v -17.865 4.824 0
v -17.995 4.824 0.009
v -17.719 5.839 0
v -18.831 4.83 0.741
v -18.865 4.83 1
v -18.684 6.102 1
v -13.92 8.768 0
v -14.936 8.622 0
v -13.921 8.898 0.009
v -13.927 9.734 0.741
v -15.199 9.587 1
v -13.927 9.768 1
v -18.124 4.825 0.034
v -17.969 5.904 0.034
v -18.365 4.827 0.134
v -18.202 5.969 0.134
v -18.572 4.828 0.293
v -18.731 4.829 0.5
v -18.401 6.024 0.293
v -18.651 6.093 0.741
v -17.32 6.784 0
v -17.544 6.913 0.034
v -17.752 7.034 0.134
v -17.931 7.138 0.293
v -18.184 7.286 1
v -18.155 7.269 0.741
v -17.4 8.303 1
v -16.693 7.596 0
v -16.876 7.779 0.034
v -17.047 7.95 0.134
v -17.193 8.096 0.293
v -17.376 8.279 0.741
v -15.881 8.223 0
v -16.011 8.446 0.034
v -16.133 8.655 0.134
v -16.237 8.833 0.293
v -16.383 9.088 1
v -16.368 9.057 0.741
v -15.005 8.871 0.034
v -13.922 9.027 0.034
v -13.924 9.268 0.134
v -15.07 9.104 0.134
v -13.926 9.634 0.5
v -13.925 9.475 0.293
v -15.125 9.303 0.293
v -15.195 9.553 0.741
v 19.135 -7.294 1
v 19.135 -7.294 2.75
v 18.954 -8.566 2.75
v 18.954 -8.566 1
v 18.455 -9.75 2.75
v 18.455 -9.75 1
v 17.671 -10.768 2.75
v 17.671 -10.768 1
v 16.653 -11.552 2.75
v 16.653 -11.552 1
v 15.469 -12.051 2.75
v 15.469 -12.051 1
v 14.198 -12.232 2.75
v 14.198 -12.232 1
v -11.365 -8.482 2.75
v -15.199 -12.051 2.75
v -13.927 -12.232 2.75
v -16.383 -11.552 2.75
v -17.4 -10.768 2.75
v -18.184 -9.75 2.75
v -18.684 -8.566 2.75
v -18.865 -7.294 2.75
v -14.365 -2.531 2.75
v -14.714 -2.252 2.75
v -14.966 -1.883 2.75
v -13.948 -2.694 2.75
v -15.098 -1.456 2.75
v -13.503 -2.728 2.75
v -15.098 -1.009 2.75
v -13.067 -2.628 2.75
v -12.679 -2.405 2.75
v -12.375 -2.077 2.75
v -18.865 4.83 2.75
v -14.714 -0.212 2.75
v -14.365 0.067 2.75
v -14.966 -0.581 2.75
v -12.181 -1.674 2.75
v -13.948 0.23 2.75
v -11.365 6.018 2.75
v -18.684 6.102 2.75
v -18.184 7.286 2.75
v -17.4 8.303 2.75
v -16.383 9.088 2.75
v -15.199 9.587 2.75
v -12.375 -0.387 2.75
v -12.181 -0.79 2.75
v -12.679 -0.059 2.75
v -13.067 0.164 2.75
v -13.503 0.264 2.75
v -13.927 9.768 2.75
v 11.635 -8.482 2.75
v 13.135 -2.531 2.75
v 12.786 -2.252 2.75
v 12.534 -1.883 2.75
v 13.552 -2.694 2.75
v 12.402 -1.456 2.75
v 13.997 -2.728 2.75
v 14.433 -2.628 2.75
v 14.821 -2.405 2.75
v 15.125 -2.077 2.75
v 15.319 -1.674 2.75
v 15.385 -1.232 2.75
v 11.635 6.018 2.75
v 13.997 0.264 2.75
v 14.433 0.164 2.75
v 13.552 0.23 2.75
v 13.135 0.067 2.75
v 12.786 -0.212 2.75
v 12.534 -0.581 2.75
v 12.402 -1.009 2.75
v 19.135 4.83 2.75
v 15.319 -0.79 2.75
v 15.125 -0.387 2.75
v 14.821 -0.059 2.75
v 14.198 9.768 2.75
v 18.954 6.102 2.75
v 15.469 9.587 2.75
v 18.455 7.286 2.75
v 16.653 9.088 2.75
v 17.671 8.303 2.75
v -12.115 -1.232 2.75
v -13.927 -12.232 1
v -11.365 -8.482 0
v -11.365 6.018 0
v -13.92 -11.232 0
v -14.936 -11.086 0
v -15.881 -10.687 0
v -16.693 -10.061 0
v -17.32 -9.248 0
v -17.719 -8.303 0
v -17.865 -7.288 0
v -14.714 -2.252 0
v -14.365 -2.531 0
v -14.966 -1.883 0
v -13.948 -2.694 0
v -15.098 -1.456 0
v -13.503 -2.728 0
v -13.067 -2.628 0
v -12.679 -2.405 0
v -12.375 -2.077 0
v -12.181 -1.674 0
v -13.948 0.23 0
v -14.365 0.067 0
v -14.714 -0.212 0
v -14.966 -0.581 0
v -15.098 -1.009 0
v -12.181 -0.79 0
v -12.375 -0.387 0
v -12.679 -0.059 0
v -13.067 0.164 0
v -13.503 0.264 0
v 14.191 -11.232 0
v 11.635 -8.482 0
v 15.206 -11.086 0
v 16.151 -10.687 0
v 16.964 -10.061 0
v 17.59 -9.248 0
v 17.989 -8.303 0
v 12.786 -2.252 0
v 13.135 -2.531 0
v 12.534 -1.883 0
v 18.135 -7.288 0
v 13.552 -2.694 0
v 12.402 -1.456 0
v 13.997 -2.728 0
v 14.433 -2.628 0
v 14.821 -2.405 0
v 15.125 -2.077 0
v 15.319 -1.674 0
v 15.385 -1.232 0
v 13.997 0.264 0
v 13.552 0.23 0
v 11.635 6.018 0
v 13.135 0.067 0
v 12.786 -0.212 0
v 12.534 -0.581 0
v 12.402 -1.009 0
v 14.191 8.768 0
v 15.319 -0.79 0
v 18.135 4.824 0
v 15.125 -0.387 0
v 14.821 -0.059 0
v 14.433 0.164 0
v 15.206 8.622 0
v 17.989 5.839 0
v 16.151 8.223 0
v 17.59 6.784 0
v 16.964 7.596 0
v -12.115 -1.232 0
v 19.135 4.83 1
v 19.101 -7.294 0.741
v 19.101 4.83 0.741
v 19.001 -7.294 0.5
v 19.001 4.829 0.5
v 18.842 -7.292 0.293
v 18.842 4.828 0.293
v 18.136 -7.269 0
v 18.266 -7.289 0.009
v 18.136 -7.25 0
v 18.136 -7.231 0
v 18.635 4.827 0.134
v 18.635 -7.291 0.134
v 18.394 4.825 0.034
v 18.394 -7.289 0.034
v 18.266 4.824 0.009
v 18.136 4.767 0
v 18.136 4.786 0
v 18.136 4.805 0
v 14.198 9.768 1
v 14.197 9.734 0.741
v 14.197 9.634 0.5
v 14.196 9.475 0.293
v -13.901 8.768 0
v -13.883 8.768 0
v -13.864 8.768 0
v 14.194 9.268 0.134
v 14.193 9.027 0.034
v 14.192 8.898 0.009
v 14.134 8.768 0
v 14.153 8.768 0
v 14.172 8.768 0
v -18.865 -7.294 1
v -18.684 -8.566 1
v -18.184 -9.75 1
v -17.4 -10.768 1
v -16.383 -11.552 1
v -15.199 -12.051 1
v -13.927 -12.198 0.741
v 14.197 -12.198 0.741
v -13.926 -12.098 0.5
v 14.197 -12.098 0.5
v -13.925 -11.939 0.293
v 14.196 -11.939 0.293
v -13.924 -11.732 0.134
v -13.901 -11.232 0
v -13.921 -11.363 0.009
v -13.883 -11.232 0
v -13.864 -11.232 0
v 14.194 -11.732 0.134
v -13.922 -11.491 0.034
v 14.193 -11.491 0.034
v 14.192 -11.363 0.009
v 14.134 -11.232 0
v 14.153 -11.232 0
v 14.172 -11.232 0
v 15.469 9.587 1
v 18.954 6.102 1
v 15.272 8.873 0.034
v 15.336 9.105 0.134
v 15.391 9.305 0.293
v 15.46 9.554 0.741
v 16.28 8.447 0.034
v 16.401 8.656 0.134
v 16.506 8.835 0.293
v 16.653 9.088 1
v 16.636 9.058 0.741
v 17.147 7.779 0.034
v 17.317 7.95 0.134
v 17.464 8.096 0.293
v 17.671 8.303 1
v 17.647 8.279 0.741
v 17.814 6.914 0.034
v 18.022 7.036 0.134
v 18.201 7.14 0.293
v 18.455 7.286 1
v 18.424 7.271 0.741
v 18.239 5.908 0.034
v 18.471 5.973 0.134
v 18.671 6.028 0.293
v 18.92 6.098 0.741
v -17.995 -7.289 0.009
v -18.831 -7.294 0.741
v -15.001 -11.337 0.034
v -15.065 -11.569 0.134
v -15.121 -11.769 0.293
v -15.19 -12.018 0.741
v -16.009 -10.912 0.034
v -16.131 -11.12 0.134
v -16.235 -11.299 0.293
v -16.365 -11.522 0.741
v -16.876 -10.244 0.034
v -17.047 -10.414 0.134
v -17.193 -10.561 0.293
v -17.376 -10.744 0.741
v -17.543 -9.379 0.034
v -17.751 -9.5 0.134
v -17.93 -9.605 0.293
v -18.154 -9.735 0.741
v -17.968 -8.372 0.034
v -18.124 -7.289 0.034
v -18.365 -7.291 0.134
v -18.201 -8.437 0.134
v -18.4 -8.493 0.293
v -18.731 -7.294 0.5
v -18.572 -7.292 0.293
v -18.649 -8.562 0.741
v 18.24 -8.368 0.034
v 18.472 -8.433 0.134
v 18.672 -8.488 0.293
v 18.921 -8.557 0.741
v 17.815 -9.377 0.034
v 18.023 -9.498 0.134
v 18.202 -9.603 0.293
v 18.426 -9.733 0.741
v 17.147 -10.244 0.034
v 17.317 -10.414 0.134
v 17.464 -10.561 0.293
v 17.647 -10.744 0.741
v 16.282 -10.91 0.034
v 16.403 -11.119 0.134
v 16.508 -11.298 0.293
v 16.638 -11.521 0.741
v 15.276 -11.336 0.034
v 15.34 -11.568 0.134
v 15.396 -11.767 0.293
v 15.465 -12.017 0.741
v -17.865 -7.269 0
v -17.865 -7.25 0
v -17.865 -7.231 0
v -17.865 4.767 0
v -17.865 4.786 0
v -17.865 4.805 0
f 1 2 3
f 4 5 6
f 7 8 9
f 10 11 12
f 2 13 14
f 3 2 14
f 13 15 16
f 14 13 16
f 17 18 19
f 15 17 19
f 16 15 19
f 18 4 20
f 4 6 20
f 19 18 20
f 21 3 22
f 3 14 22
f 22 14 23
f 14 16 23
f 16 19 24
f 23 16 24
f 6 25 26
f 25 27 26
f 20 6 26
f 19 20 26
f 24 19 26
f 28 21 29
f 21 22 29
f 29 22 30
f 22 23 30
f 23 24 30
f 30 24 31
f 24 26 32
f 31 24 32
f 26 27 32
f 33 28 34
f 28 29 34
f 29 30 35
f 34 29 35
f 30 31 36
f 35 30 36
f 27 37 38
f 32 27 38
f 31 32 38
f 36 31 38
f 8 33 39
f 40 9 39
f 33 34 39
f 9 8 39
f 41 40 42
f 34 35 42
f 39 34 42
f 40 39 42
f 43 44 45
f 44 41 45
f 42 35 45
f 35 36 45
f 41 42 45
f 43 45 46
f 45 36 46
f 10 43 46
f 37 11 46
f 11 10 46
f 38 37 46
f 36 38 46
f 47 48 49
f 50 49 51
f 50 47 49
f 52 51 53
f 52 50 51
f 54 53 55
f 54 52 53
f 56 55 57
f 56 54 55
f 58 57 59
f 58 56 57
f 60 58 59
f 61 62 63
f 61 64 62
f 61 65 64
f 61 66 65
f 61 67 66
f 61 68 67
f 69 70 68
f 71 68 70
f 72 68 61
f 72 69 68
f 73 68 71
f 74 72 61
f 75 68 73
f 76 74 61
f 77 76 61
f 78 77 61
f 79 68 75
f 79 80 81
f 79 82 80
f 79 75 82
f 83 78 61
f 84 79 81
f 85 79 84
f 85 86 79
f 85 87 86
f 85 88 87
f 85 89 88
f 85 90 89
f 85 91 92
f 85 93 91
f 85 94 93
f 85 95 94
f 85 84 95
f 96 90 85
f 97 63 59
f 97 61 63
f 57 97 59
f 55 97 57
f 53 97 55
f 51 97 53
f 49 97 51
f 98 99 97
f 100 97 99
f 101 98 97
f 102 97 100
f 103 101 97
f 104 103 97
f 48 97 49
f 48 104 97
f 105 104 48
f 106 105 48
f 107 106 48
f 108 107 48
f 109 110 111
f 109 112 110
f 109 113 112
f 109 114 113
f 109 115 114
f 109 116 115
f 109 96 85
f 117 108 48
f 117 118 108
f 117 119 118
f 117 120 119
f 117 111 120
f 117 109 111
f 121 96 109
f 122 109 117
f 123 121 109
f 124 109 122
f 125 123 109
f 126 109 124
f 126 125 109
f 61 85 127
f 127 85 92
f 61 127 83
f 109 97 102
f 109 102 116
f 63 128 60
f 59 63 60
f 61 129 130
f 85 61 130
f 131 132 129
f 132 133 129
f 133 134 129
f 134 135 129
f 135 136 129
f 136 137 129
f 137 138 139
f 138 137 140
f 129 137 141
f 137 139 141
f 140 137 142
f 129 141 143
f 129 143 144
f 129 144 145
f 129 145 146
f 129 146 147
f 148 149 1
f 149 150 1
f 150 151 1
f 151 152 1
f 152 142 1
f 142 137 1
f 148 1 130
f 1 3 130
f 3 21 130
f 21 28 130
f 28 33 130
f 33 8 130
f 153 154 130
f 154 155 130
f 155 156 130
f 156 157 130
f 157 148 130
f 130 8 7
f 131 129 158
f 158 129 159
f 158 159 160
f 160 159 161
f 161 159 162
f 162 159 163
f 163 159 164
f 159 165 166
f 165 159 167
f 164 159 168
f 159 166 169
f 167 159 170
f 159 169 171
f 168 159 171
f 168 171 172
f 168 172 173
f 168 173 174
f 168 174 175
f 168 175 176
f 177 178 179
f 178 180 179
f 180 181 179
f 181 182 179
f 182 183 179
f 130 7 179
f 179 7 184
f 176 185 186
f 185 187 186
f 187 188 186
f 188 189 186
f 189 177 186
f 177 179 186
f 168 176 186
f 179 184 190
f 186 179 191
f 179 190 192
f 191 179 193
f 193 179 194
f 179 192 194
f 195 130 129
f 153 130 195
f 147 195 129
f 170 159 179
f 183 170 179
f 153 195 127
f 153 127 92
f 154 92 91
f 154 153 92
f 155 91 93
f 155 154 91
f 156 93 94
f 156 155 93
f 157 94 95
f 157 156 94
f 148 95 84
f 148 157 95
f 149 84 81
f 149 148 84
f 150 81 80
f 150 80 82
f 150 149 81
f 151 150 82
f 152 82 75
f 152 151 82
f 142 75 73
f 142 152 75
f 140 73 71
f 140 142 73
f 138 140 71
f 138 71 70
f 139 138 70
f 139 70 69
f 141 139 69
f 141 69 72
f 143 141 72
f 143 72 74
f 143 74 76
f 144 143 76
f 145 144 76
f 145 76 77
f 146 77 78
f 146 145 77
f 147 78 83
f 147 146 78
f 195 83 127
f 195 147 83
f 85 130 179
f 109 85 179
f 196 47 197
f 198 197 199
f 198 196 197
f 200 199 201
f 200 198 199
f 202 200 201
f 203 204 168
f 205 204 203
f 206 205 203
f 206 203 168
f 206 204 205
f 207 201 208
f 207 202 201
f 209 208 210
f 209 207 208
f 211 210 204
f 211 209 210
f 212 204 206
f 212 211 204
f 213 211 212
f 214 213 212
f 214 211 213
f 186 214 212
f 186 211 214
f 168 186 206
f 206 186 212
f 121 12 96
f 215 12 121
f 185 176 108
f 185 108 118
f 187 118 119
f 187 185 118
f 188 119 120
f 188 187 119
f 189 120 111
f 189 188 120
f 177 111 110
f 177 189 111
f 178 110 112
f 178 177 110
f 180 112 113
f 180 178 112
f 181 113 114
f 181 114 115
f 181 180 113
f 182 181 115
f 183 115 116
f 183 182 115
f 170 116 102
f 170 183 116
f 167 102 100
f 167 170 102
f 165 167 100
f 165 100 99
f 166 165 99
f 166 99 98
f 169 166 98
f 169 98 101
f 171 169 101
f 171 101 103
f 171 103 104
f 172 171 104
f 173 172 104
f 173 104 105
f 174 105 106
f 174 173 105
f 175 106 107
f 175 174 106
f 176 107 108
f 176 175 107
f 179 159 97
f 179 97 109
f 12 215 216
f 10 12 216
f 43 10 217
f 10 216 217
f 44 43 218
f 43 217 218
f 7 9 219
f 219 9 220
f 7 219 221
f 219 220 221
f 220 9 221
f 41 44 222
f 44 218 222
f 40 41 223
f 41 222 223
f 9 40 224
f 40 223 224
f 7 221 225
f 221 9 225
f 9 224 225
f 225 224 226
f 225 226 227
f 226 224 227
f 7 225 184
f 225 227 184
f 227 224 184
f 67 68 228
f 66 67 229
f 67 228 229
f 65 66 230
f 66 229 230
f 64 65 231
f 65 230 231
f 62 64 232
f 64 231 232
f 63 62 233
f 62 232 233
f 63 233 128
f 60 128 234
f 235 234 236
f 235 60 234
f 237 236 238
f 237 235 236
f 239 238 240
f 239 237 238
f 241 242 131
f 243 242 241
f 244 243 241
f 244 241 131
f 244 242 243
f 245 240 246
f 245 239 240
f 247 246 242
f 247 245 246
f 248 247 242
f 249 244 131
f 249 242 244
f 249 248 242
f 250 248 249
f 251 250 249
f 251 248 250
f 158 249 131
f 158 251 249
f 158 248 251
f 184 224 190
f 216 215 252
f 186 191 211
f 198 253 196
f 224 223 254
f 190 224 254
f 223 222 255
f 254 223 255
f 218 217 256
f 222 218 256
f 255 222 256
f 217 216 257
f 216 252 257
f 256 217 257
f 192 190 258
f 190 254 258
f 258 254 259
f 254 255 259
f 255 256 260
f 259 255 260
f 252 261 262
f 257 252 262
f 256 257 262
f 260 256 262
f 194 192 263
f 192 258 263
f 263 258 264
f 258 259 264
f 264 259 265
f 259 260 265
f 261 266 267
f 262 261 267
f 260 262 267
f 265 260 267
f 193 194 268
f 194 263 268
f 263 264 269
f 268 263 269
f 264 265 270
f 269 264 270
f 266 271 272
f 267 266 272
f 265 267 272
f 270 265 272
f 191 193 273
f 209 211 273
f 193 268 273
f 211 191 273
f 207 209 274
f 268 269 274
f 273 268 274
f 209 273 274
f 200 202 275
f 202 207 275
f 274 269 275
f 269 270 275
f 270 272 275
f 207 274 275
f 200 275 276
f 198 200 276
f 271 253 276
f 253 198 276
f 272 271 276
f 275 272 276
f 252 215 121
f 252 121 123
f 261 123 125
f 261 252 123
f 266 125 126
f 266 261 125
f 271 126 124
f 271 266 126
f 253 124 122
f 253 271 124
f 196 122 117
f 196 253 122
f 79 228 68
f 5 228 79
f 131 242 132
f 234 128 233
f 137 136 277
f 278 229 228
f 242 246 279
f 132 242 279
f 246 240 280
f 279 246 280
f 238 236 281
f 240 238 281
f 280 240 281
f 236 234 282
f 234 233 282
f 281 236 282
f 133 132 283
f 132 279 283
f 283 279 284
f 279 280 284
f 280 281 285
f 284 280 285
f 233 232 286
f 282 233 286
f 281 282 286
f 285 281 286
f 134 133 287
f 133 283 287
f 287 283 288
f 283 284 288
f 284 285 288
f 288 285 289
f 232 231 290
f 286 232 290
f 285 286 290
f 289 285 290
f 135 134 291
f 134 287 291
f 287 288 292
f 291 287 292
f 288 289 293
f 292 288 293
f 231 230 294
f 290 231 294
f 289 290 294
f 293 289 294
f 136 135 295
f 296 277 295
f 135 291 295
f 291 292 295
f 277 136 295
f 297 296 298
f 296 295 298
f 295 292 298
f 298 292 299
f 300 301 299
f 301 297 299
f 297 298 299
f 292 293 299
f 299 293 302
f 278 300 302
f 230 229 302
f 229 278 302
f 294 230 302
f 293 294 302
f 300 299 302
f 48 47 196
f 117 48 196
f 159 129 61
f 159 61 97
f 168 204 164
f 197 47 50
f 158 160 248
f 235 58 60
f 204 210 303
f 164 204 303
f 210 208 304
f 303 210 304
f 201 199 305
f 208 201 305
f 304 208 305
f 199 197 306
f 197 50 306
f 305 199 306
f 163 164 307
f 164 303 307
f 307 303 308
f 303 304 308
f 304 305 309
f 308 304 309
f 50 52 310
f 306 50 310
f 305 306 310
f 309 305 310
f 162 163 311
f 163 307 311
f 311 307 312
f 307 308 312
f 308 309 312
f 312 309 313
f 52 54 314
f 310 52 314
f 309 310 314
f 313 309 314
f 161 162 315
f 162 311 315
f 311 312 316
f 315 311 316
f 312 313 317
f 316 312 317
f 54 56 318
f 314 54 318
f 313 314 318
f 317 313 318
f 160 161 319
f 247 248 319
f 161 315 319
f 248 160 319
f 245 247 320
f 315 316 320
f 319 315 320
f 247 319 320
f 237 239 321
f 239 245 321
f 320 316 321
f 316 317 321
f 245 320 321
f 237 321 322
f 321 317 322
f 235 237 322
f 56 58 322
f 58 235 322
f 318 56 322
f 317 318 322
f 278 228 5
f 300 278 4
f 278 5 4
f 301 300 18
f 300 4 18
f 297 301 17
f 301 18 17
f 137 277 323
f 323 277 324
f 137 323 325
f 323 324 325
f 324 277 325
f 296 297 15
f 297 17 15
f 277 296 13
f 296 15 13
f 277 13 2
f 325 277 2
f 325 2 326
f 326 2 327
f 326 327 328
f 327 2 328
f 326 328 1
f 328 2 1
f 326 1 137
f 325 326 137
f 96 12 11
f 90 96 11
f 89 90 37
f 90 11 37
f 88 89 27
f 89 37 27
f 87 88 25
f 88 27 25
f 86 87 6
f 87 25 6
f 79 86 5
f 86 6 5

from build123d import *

# Parameters (mm, degrees)
F0_W         = 38
F0_H         = 22
F0_R         = 1.5
F0_W_2       = 23
F0_H_2       = 14.5
F1_DEPTH     = 2.75
F2_R         = 1
F3_T3_ANGLE  = 90
F3_T6_ANGLE  = 90
F3_T9_ANGLE  = 90
F3_T12_ANGLE = 90
F3_T15_DEPTH = 15.2524142536
F3_T18_DEPTH = 15.2524142536
F3_T21_DEPTH = 15.2524142536
F3_T24_DEPTH = 15.2524142536


# Not quite as in the source:
# - a fillet or chamfer that OpenCascade refuses, or shapes differently, is made with other operations: its cross-section is extruded or revolved along the edge and cut away or added


with BuildPart() as f1:
    # F0 (on Top) → F1 (new body)
    with BuildSketch(Plane.XY):
        with Locations((0.1353118792, -1.2320824713)):
            Rectangle(F0_W, F0_H)
        with Locations((-13.6146881208, -1.2320824713)):
            Circle(F0_R, mode=Mode.SUBTRACT)
        with Locations((0.1353118792, -1.2320824713)):
            Rectangle(F0_W_2, F0_H_2, mode=Mode.SUBTRACT)
        with Locations((13.8853118792, -1.2320824713)):
            Circle(F0_R, mode=Mode.SUBTRACT)
    extrude(amount=F1_DEPTH)

    # F2
    f2_edges = [f1.edges().sort_by_distance(p)[0] for p in [
        (19.135312, -1.232082, 0),
        (0.135312, 9.767918, 0),
        (-18.864688, -1.232082, 0),
        (0.135312, -12.232082, 0),
    ]]
    fillet(f2_edges, radius=F2_R)

    # F3: fillet of radius 5 on 4 edges, made by hand


with BuildPart() as f3_tool1:
    # F3_s2 → F3_t3 (revolve)
    with BuildSketch(Plane.XZ.offset(-4.7669518433)):
        with BuildLine():
            ThreePointArc((-17.8650881208, 0), (-18.572194902, 0.2928932188), (-18.8650881208, 1))
            Line((-18.8650881208, 1), (-18.8650881208, 0))
            Line((-18.8650881208, 0), (-17.8650881208, 0))
        make_face()
    revolve(axis=Axis((-13.8637224354, 4.7669518433, 0), (0, 0, -1)), revolution_arc=F3_T3_ANGLE)


with BuildPart() as f3_tool4:
    # F3_s5 → F3_t6 (revolve)
    with BuildSketch(Plane.YZ.offset(-13.8637224354)):
        with BuildLine():
            ThreePointArc((-11.2324824713, 0), (-11.9395892524, 0.2928932188), (-12.2324824713, 1))
            Line((-12.2324824713, 1), (-12.2324824713, 0))
            Line((-12.2324824713, 0), (-11.2324824713, 0))
        make_face()
    revolve(axis=Axis((-13.8637224354, -7.2311167858, 0), (0, 0, -1)), revolution_arc=F3_T6_ANGLE)


with BuildPart() as f3_tool7:
    # F3_s8 → F3_t9 (revolve)
    with BuildSketch(Plane.XZ.offset(7.2311167858)):
        with BuildLine():
            ThreePointArc((18.1357118792, 0), (18.8428186604, 0.2928932188), (19.1357118792, 1))
            Line((19.1357118792, 1), (19.1357118792, 0))
            Line((19.1357118792, 0), (18.1357118792, 0))
        make_face()
    revolve(axis=Axis((14.1343461938, -7.2311167858, 0), (0, 0, -1)), revolution_arc=F3_T9_ANGLE)


with BuildPart() as f3_tool10:
    # F3_s11 → F3_t12 (revolve)
    with BuildSketch(Plane.YZ.offset(14.1343461938)):
        with BuildLine():
            ThreePointArc((8.7683175287, 0), (9.4754243099, 0.2928932188), (9.7683175287, 1))
            Line((9.7683175287, 1), (9.7683175287, 0))
            Line((9.7683175287, 0), (8.7683175287, 0))
        make_face()
    revolve(axis=Axis((14.1343461938, 4.7669518433, 0), (0, 0, -1)), revolution_arc=F3_T12_ANGLE)


with BuildPart() as f3_tool13:
    # F3_s14 → F3_t15 (new body)
    with BuildSketch(Plane.XY):
        with BuildLine():
            ThreePointArc((14.1343461938, 9.7683175287), (17.6708457852, 8.3034514347), (19.1357118792, 4.7669518433))
            Line((19.1357118792, 4.7669518433), (19.6358484478, 4.7669518433))
            ThreePointArc((19.6358484478, 4.7669518433), (19.6354484478, 7.267434686), (19.6354484478, 9.7679175287))
            Line((19.6354484478, 9.7679175287), (19.1353118792, 10.2680540973))
            ThreePointArc((19.1353118792, 10.2680540973), (16.6348290365, 10.2680540973), (14.1343461938, 10.2684540973))
            Line((14.1343461938, 10.2684540973), (14.1343461938, 9.7683175287))
        make_face()
    extrude(amount=F3_T15_DEPTH)


with BuildPart() as f3_tool16:
    # F3_s17 → F3_t18 (new body)
    with BuildSketch(Plane.XY):
        with BuildLine():
            ThreePointArc((19.1357118792, -7.2311167858), (17.6708457852, -10.7676163772), (14.1343461938, -12.2324824713))
            Line((14.1343461938, -12.2324824713), (14.1343461938, -12.7326190398))
            ThreePointArc((14.1343461938, -12.7326190398), (16.6348290365, -12.7322190398), (19.1353118792, -12.7322190398))
            Line((19.1353118792, -12.7322190398), (19.6354484478, -12.2320824713))
            ThreePointArc((19.6354484478, -12.2320824713), (19.6354484478, -9.7315996285), (19.6358484478, -7.2311167858))
            Line((19.6358484478, -7.2311167858), (19.1357118792, -7.2311167858))
        make_face()
    extrude(amount=F3_T18_DEPTH)


with BuildPart() as f3_tool19:
    # F3_s20 → F3_t21 (new body)
    with BuildSketch(Plane.XY):
        with BuildLine():
            ThreePointArc((-18.8650881208, -7.2311167858), (-17.4002220267, -10.7676163772), (-13.8637224354, -12.2324824713))
            Line((-13.8637224354, -12.2324824713), (-13.8637224354, -12.7326190398))
            ThreePointArc((-13.8637224354, -12.7326190398), (-16.3642052781, -12.7322190398), (-18.8646881208, -12.7322190398))
            Line((-18.8646881208, -12.7322190398), (-19.3648246893, -12.2320824713))
            ThreePointArc((-19.3648246893, -12.2320824713), (-19.3648246893, -9.7315996285), (-19.3652246893, -7.2311167858))
            Line((-19.3652246893, -7.2311167858), (-18.8650881208, -7.2311167858))
        make_face()
    extrude(amount=F3_T21_DEPTH)


with BuildPart() as f3_tool22:
    # F3_s23 → F3_t24 (new body)
    with BuildSketch(Plane.XY):
        with BuildLine():
            ThreePointArc((-13.8637224354, 9.7683175287), (-17.4002220267, 8.3034514347), (-18.8650881208, 4.7669518433))
            Line((-18.8650881208, 4.7669518433), (-19.3652246893, 4.7669518433))
            ThreePointArc((-19.3652246893, 4.7669518433), (-19.3648246893, 7.267434686), (-19.3648246893, 9.7679175287))
            Line((-19.3648246893, 9.7679175287), (-18.8646881208, 10.2680540973))
            ThreePointArc((-18.8646881208, 10.2680540973), (-16.3642052781, 10.2680540973), (-13.8637224354, 10.2684540973))
            Line((-13.8637224354, 10.2684540973), (-13.8637224354, 9.7683175287))
        make_face()
    extrude(amount=F3_T24_DEPTH)


with BuildPart() as f1_1:
    add(f1.part)

    # F3_t25: cut F3_tool1, F3_tool4, F3_tool7, F3_tool10, F3_tool13, F3_tool16, F3_tool19, F3_tool22
    add([f3_tool1.part, f3_tool4.part, f3_tool7.part, f3_tool10.part, f3_tool13.part, f3_tool16.part, f3_tool19.part, f3_tool22.part], mode=Mode.SUBTRACT)


solid = f1_1.part
